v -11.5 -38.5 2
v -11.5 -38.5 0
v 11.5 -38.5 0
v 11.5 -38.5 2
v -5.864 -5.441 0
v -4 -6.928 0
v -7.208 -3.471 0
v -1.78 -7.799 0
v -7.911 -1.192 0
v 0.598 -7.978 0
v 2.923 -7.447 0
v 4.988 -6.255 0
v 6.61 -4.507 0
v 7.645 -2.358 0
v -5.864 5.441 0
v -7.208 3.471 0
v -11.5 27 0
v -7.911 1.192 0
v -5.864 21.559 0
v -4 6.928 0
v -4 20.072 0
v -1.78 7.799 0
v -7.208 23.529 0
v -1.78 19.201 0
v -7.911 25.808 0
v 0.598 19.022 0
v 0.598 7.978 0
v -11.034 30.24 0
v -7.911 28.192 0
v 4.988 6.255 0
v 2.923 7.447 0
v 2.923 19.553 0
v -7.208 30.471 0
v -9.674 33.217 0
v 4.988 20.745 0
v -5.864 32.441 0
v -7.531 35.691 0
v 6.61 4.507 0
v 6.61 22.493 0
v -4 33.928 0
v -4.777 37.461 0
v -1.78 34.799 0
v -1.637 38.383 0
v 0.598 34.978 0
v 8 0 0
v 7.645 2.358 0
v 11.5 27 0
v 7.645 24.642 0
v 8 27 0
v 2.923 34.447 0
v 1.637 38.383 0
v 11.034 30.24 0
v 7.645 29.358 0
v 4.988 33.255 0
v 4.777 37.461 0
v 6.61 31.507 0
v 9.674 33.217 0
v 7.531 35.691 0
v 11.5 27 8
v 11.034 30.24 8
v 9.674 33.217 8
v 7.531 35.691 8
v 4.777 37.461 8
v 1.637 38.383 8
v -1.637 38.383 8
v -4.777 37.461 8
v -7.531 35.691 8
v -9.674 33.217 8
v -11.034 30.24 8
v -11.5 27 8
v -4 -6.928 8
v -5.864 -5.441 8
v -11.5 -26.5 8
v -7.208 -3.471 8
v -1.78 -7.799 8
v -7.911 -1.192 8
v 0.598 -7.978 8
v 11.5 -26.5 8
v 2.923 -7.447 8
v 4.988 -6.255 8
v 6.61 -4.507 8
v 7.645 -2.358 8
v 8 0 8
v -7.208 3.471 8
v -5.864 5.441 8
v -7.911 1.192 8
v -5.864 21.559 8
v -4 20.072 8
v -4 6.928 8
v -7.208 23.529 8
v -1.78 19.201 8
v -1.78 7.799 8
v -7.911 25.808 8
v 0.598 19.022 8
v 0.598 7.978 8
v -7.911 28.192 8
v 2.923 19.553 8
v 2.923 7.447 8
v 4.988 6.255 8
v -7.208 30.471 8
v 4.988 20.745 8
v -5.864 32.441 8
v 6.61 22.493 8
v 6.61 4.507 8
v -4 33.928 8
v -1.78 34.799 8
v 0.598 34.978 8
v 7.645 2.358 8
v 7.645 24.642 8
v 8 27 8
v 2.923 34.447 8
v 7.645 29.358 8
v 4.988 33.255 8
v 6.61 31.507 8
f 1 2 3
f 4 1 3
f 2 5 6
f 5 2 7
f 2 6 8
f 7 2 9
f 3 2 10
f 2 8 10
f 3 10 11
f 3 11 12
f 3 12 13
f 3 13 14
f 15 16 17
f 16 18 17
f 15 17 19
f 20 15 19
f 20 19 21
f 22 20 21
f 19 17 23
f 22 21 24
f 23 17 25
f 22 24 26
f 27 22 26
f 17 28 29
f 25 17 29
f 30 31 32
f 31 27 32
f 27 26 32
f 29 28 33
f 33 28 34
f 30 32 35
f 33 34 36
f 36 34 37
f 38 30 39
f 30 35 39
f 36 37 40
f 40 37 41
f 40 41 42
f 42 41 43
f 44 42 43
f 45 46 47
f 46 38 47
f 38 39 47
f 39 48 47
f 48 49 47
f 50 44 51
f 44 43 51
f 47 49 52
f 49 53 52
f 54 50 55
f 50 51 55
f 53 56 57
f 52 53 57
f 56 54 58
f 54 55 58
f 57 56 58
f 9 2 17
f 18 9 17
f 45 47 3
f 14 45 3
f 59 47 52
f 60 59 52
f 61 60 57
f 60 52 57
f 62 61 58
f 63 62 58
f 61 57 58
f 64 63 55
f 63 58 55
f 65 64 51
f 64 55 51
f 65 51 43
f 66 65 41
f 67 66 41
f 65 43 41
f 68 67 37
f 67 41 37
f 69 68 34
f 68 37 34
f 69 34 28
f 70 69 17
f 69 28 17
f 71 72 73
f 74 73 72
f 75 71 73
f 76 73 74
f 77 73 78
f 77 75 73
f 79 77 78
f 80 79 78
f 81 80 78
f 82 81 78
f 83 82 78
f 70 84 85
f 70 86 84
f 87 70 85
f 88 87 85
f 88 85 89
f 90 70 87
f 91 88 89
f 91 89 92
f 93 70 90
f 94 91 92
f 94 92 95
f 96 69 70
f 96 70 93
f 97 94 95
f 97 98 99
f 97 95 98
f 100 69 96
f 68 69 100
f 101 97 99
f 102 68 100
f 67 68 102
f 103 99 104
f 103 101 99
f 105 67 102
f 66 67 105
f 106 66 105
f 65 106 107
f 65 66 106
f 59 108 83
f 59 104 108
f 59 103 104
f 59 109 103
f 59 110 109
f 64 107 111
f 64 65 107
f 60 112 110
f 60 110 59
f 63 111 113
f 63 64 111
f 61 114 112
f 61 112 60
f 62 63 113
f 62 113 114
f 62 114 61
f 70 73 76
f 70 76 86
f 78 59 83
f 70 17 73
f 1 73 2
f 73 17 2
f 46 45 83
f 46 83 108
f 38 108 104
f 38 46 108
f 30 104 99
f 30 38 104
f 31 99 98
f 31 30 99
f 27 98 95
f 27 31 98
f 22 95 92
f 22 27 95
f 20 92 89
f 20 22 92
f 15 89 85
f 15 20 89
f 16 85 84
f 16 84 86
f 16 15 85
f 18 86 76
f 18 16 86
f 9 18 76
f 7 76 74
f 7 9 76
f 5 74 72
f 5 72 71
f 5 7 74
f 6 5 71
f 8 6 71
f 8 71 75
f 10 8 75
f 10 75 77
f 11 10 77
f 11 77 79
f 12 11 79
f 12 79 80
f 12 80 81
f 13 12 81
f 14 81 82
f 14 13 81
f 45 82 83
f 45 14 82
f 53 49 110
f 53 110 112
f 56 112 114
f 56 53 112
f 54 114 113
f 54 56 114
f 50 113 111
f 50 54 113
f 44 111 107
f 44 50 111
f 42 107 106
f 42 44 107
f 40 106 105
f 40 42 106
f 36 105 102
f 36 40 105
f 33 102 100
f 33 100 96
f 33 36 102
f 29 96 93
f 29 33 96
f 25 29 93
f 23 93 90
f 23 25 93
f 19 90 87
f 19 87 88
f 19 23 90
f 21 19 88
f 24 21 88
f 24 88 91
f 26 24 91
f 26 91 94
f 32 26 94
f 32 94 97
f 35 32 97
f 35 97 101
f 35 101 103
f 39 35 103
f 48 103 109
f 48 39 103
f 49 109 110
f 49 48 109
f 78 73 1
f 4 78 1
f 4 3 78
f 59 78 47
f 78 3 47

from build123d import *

# Parameters (mm, degrees)
F0_R     = 8
F1_DEPTH = 8
F3_DEPTH = 23.001


with BuildPart() as f1:
    # F0 (on Top) → F1 (new body)
    with BuildSketch(Plane.XY):
        with BuildLine():
            Line((-11.5, 27), (-11.5, -38.5))
            Line((-11.5, -38.5), (11.5, -38.5))
            Line((11.5, -38.5), (11.5, 27))
            ThreePointArc((11.5, 27), (0, 38.5), (-11.5, 27))
        make_face()
        Circle(F0_R, mode=Mode.SUBTRACT)
        with Locations((0, 27)):
            Circle(F0_R, mode=Mode.SUBTRACT)
    extrude(amount=F1_DEPTH)

    # F2 (on face) → F3 (cut, through all)
    with BuildSketch(Plane(origin=(-11.5, 0, 0), x_dir=(0, -1, 0), z_dir=(-1, 0, 0))):
        Polygon((26.5, 8), (38.5, 2), (38.5, 8), align=None)
    extrude(amount=-F3_DEPTH, mode=Mode.SUBTRACT)


solid = f1.part
